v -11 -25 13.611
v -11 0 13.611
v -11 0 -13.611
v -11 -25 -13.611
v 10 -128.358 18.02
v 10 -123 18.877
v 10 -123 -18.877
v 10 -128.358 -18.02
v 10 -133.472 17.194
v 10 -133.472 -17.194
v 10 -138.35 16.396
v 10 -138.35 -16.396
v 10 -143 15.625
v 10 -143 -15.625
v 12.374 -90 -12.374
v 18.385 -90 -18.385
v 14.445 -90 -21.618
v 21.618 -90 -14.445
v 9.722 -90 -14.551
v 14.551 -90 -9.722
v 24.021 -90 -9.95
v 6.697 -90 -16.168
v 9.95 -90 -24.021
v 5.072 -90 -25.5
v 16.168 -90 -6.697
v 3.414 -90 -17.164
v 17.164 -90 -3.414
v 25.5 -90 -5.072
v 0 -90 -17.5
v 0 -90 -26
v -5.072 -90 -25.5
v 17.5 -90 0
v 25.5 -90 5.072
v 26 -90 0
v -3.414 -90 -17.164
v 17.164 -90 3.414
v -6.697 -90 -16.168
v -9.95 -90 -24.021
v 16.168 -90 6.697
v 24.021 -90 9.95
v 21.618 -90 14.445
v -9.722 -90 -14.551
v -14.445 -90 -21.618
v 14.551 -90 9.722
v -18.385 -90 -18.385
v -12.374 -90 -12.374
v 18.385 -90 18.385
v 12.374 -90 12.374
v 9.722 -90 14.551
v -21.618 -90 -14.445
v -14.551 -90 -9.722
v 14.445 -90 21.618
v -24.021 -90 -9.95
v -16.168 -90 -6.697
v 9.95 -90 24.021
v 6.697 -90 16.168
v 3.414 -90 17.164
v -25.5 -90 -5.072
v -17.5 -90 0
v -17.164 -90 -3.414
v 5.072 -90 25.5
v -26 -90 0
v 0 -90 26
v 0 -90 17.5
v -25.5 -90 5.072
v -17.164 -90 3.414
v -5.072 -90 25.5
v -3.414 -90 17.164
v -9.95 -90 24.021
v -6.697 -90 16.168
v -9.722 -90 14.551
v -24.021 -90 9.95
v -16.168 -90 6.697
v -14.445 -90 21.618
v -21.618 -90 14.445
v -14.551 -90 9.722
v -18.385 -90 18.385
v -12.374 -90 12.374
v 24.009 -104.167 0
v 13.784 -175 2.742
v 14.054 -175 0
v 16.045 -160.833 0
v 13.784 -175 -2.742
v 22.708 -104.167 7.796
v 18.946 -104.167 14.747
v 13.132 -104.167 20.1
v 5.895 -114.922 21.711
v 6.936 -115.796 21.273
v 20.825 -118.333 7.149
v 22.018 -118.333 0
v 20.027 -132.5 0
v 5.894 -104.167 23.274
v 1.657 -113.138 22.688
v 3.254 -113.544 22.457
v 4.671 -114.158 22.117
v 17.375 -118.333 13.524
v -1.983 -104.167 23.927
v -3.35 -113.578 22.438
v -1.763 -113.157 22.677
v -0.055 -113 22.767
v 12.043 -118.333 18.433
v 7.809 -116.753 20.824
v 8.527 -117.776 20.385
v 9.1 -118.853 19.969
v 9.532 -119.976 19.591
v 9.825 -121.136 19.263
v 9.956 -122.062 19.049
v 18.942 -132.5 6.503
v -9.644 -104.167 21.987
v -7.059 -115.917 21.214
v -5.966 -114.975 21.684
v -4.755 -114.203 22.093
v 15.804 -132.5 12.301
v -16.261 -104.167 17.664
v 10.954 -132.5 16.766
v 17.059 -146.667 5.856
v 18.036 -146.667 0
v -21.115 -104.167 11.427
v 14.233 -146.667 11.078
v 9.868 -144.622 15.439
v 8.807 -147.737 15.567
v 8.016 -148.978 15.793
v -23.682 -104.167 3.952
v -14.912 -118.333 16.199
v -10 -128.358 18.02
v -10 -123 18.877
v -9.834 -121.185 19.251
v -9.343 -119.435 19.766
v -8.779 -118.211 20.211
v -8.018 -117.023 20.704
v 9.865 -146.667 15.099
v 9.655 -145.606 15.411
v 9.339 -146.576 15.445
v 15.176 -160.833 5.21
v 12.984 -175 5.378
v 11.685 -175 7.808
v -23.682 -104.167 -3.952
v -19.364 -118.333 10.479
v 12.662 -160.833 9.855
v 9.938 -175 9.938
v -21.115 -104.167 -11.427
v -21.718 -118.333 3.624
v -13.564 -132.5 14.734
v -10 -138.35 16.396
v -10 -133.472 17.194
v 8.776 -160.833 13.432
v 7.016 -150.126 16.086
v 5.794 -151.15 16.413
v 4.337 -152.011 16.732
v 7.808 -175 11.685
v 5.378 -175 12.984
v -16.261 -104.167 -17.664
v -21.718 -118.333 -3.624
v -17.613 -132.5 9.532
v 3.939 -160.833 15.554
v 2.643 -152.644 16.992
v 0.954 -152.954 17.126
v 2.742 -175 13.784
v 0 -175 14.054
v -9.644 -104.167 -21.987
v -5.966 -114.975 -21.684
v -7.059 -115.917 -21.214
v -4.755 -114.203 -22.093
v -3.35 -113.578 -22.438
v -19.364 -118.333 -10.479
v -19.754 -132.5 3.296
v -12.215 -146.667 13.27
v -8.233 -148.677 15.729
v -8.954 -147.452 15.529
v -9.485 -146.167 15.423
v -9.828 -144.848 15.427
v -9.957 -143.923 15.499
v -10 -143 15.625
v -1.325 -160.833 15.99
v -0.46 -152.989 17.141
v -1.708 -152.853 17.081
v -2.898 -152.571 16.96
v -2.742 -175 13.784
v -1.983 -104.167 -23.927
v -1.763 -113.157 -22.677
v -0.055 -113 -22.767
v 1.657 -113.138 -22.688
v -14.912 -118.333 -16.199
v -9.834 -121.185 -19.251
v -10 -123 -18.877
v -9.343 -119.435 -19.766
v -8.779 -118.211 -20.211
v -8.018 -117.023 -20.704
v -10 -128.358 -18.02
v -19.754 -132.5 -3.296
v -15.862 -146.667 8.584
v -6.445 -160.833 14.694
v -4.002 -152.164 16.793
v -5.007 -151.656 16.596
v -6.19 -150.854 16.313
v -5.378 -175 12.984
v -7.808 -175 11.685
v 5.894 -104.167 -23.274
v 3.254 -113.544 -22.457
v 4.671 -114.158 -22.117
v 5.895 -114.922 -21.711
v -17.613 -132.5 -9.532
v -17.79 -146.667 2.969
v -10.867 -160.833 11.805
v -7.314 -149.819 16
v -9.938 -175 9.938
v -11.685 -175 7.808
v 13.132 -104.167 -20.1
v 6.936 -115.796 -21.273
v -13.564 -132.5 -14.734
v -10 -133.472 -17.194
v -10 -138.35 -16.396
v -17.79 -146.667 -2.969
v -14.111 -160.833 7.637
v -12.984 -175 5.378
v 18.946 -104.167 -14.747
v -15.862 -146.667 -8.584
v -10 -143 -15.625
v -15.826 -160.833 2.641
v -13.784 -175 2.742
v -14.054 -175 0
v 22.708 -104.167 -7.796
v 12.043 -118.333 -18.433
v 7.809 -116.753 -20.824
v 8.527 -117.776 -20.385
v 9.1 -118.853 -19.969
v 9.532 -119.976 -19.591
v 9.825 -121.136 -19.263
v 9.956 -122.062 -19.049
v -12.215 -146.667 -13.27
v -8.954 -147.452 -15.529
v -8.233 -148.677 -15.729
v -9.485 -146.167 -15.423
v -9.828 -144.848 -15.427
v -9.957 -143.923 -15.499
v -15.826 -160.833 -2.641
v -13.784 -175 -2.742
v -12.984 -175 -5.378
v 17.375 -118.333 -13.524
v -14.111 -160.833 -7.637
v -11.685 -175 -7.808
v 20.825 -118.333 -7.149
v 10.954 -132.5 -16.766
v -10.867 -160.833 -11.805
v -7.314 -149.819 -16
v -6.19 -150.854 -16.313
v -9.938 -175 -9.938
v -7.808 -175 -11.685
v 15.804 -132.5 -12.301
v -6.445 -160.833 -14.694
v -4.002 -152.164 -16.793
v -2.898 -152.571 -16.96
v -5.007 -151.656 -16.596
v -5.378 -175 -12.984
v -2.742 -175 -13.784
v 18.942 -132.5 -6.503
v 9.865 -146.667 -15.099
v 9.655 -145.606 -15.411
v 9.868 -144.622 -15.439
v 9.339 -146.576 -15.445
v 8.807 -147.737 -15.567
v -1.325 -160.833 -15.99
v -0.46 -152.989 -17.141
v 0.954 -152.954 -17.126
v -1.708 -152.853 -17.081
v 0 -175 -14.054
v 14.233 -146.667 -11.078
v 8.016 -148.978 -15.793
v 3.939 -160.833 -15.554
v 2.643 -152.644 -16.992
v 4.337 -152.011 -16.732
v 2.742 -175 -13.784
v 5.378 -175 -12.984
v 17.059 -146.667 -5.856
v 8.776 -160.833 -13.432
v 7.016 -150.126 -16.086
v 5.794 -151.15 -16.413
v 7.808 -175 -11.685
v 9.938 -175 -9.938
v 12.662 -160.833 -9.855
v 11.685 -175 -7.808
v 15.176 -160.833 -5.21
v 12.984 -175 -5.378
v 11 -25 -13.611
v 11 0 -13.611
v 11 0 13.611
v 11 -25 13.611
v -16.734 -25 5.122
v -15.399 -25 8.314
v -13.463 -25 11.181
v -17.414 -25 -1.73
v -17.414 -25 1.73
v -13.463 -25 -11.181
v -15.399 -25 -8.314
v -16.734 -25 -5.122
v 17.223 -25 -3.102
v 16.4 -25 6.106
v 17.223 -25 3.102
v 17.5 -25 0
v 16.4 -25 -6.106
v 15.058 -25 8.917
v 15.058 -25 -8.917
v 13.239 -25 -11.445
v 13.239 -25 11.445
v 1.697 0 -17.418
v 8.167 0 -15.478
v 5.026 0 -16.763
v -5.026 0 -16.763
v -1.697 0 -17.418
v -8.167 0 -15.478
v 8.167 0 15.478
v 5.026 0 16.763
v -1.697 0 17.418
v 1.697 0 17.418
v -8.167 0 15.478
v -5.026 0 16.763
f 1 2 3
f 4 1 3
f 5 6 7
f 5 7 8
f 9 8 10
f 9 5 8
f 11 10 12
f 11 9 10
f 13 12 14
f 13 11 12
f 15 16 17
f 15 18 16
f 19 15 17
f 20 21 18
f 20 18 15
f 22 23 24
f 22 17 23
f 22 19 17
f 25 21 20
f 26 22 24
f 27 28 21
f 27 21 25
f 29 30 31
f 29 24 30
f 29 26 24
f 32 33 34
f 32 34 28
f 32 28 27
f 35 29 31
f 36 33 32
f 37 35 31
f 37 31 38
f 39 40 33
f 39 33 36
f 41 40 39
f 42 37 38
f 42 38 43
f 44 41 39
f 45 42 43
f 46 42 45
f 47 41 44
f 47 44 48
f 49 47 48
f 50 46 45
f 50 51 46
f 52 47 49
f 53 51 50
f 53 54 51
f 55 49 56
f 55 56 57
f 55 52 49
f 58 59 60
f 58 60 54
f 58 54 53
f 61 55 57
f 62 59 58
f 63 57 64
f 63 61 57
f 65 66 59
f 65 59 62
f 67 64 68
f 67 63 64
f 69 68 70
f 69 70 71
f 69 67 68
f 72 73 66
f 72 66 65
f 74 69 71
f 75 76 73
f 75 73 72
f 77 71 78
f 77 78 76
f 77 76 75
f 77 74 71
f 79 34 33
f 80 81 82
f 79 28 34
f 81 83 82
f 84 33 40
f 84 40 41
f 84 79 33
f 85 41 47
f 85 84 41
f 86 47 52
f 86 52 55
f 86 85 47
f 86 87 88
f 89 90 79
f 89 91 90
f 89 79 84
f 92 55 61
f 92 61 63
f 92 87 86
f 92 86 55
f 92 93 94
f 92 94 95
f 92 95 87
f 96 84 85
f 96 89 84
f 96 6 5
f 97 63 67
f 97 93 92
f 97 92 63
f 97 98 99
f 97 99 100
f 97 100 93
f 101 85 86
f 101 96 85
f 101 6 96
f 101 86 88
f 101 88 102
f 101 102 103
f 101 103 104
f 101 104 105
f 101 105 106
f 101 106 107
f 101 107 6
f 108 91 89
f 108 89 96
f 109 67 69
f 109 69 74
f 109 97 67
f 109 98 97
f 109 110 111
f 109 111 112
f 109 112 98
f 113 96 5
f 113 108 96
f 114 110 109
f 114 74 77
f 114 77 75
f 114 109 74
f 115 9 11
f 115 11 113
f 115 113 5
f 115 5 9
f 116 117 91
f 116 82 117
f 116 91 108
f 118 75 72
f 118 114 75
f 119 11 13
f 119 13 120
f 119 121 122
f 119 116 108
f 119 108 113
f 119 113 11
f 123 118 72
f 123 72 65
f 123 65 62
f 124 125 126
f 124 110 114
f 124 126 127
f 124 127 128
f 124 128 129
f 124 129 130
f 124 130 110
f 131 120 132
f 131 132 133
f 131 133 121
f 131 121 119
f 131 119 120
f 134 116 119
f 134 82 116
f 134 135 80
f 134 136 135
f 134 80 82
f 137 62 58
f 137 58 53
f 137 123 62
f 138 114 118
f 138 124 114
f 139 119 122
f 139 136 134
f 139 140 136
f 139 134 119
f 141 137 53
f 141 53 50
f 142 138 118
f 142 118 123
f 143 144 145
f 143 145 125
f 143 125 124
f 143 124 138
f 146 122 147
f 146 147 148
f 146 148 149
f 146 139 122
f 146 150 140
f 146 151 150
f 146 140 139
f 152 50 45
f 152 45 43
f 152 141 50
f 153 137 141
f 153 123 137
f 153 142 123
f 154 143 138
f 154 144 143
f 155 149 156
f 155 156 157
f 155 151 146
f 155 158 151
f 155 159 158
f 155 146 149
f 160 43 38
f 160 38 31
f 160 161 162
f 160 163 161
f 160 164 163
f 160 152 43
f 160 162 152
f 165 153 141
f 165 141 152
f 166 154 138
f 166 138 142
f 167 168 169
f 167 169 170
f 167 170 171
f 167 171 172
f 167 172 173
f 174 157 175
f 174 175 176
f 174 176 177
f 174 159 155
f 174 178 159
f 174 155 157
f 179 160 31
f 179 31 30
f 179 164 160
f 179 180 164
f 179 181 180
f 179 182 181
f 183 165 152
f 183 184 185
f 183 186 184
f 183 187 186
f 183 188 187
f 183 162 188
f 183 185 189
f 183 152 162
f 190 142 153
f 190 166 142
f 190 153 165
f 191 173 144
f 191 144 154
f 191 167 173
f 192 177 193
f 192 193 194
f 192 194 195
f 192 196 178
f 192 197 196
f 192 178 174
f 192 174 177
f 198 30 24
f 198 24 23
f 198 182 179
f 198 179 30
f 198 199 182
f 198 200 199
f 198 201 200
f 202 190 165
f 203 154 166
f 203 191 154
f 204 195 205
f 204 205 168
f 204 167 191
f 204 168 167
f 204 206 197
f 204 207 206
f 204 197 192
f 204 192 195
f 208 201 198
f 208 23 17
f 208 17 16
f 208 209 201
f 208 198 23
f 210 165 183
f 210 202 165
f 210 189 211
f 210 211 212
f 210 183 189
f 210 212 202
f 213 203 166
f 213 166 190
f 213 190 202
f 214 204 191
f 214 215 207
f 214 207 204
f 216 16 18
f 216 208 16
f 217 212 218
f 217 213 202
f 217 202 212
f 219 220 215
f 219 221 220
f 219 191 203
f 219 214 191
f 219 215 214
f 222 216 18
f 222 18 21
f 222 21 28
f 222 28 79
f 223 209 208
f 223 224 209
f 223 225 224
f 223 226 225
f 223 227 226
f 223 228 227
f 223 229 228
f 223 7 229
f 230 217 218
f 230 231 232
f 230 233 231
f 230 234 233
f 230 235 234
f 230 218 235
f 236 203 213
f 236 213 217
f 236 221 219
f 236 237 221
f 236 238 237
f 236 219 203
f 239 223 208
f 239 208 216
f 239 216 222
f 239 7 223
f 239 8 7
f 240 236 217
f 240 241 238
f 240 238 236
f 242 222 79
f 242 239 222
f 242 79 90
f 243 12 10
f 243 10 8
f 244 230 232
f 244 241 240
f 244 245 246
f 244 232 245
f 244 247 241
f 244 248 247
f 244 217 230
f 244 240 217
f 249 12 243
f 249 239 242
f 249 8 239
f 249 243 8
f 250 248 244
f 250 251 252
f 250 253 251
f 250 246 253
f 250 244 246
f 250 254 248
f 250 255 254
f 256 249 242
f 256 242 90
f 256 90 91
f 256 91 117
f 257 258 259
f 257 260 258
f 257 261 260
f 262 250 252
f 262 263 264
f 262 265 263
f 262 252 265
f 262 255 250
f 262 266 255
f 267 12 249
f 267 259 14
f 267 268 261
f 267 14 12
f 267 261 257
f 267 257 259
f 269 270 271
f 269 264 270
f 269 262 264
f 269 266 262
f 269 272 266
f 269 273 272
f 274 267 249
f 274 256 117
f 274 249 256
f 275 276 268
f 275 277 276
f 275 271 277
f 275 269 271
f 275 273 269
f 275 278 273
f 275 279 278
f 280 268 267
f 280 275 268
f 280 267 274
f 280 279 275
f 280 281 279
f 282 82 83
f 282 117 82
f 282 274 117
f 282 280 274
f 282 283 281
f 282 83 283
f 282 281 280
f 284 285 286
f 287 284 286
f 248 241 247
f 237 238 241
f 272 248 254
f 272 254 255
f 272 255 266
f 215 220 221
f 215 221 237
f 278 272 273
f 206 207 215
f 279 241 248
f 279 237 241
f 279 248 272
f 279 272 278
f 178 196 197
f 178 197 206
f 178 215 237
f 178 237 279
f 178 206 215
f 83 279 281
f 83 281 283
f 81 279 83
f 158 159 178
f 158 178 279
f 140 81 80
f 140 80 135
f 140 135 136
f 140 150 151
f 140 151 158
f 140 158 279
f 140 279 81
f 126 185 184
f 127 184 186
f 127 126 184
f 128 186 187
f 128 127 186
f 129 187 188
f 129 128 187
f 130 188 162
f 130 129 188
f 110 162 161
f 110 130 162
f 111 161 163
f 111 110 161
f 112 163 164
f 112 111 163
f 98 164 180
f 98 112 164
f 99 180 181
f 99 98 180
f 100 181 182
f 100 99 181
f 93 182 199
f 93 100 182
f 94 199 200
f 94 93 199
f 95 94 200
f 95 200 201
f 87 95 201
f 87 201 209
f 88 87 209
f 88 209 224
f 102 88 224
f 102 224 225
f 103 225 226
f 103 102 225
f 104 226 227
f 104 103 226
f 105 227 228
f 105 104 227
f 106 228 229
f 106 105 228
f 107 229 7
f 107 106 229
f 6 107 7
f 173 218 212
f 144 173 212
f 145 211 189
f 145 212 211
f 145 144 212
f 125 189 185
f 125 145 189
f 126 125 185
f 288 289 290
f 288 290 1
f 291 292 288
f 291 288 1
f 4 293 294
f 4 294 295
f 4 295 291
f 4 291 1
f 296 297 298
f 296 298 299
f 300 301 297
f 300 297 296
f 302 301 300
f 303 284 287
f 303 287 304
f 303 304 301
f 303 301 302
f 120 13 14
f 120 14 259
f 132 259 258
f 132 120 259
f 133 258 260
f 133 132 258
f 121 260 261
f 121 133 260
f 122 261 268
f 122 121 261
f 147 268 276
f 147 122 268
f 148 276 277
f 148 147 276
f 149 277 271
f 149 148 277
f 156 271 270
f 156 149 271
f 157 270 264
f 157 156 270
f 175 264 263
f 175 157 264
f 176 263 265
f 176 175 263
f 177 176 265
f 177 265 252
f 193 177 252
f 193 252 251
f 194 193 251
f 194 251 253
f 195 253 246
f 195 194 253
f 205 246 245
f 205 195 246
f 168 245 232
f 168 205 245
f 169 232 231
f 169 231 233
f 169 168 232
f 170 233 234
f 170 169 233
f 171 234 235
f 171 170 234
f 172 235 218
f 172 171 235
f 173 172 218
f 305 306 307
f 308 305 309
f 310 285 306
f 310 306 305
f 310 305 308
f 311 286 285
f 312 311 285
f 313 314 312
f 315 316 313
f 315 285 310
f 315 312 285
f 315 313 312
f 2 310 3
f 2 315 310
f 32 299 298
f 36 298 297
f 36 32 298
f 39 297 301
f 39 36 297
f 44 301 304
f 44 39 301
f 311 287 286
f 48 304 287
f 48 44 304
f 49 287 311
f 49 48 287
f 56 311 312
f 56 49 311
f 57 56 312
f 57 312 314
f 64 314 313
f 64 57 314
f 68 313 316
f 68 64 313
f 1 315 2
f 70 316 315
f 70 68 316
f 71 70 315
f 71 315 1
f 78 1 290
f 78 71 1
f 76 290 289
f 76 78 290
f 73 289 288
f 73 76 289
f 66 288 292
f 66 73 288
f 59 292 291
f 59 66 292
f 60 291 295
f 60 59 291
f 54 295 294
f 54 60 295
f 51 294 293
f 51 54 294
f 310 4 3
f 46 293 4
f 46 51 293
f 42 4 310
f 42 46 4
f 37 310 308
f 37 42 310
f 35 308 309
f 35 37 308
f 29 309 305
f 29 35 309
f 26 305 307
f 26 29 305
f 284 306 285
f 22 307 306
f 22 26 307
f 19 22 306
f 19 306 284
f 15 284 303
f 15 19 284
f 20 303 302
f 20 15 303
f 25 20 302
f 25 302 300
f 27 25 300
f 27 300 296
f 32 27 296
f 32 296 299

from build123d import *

# Parameters (mm, degrees)
CUT_EXTRUDE_1_DEPTH = 25
CUT_EXTRUDE_2_DEPTH = 25


with BuildPart() as part:
    # Эскиз1 → Повернуть1 (revolve)
    with BuildSketch(Plane.XY):
        Polygon((0, 0), (17.5, 0), (17.5, -90), (26, -90), (14.05402905, -175), (0, -175), align=None)
    revolve(axis=Axis((0, 0, 0), (0, -1, 0)))

    # Эскиз2 → Вырез-Вытянуть1 (cut, symmetric)
    with BuildSketch(Plane.XY):
        with BuildLine():
            Line((10, -123), (10, -143))
            ThreePointArc((10, -143), (0, -153), (-10, -143))
            Line((-10, -143), (-10, -123))
            ThreePointArc((-10, -123), (0, -113), (10, -123))
        make_face()
    extrude(amount=CUT_EXTRUDE_1_DEPTH, both=True, mode=Mode.SUBTRACT)

    # Эскиз3 → Вырез-Вытянуть2 (cut)
    with BuildSketch(Plane(origin=(0, 0, 0), x_dir=(1, 0, 0), z_dir=(0, 1, 0))):
        with BuildLine():
            Line((-11, -13.610657589), (-11, 13.610657589))
            ThreePointArc((-11, 13.610657589), (-17.5, 0), (-11, -13.610657589))
        make_face()
        with BuildLine():
            ThreePointArc((17.5, 0), (15.791611697, 7.541551564), (11, 13.610657589))
            Line((11, 13.610657589), (11, -13.610657589))
            ThreePointArc((11, -13.610657589), (15.791611697, -7.541551564), (17.5, 0))
        make_face()
    extrude(amount=-CUT_EXTRUDE_2_DEPTH, mode=Mode.SUBTRACT)


solid = part.part
